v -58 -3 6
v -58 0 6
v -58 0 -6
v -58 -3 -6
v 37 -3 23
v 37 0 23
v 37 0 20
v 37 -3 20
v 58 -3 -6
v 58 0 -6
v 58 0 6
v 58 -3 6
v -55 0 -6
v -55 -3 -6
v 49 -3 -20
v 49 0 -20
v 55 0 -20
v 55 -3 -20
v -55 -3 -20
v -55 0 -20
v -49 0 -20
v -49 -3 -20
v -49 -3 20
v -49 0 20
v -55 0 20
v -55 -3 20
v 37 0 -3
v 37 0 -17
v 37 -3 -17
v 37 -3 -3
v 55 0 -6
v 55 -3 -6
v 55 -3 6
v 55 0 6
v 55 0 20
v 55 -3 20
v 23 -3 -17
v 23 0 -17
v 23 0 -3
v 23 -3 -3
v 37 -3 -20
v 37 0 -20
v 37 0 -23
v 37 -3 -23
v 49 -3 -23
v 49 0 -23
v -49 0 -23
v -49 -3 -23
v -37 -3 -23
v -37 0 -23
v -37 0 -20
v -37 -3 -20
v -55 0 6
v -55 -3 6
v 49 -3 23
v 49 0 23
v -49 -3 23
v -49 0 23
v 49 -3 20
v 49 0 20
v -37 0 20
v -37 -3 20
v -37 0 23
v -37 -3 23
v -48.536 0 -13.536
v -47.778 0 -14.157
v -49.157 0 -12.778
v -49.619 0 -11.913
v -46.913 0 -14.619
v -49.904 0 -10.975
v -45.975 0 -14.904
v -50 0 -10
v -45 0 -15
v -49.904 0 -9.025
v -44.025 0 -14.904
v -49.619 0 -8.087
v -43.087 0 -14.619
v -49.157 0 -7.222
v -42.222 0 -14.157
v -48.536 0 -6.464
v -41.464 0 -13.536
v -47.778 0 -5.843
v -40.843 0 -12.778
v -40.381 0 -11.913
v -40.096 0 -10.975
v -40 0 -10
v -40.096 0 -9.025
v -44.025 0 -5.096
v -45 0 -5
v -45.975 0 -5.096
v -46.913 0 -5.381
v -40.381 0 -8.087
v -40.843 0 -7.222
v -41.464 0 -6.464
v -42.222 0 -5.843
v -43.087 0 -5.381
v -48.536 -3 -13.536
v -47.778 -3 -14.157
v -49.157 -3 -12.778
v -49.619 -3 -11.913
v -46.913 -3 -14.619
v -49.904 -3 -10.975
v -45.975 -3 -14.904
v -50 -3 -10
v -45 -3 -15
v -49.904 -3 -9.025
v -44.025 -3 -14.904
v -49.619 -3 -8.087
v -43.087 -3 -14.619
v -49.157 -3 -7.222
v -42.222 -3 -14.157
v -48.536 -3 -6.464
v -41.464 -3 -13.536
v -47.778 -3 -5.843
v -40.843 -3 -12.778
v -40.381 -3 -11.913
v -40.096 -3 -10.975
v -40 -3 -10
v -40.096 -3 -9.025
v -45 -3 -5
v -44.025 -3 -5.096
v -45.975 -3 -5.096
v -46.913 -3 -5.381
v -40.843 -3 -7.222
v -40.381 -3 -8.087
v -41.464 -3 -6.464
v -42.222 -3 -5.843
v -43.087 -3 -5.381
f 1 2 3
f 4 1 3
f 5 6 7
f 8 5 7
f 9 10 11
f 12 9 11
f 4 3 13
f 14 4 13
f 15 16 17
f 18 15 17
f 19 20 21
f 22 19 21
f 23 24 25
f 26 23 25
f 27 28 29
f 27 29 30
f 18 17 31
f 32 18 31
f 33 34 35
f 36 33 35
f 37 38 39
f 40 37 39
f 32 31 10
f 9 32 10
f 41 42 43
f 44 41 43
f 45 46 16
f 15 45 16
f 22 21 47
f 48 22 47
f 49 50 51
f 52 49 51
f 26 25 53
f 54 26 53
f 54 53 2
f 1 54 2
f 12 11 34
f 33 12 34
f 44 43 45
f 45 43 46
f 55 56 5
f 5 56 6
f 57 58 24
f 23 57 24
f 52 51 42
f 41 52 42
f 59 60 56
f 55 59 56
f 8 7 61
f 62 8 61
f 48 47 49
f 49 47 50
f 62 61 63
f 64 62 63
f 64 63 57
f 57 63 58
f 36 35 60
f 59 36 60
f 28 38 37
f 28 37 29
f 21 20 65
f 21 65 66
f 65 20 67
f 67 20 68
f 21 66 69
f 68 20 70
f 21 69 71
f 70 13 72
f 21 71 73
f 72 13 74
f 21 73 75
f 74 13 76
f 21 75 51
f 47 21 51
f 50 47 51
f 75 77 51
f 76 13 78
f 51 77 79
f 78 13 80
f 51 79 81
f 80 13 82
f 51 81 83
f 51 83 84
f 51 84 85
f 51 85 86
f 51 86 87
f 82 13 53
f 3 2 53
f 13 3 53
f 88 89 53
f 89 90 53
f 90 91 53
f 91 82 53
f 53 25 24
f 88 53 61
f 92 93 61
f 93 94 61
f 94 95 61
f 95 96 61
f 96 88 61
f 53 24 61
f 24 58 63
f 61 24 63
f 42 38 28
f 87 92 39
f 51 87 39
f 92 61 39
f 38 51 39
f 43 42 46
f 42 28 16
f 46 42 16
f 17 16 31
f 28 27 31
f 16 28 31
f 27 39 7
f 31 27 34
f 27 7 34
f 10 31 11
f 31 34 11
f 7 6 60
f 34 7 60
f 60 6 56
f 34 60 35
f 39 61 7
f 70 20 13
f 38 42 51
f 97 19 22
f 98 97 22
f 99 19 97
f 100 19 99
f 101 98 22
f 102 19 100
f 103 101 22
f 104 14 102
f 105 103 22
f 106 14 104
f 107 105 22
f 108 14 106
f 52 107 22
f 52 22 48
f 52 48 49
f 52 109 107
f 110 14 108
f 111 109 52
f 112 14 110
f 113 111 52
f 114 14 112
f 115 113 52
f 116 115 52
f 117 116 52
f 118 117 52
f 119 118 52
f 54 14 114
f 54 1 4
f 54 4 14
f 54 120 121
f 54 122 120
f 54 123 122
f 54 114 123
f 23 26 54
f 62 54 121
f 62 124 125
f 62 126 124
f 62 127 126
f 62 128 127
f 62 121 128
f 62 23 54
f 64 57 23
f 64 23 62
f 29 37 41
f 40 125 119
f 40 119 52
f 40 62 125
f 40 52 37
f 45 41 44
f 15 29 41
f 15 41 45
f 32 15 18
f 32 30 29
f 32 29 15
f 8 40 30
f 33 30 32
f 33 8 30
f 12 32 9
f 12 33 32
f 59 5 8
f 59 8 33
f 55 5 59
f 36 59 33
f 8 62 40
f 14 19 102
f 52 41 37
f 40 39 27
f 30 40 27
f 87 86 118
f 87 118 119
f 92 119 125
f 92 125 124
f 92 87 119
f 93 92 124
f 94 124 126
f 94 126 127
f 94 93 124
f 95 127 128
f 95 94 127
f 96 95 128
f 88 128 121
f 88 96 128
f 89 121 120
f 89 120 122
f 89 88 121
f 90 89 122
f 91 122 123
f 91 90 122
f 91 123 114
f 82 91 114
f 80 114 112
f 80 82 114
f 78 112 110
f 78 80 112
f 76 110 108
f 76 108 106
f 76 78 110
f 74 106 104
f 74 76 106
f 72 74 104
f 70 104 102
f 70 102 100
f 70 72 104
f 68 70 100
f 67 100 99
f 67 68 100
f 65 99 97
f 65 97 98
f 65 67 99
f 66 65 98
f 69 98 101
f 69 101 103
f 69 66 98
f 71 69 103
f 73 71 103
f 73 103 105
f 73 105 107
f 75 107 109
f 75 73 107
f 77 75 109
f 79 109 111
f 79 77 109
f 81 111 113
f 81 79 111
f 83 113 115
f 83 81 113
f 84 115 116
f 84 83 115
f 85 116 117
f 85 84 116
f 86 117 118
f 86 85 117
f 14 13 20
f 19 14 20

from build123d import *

# Parameters (mm, degrees)
F0_R     = 5
F0_W     = 14
F0_H     = 14
F1_DEPTH = 3


with BuildPart() as f1:
    # F0 (on Front) → F1 (new body)
    with BuildSketch(Plane.XZ):
        Polygon((55, 6), (55, 20), (49, 20), (49, 23), (37, 23), (37, 20), (-37, 20), (-37, 23), (-49, 23), (-49, 20), (-55, 20), (-55, 6), (-58, 6), (-58, -6), (-55, -6), (-55, -20), (-49, -20), (-49, -23), (-37, -23), (-37, -20), (37, -20), (37, -23), (49, -23), (49, -20), (55, -20), (55, -6), (58, -6), (58, 6), align=None)
        with Locations((-45, -10)):
            Circle(F0_R, mode=Mode.SUBTRACT)
        with Locations((30, -10)):
            Rectangle(F0_W, F0_H, mode=Mode.SUBTRACT)
    extrude(amount=F1_DEPTH)


solid = f1.part
